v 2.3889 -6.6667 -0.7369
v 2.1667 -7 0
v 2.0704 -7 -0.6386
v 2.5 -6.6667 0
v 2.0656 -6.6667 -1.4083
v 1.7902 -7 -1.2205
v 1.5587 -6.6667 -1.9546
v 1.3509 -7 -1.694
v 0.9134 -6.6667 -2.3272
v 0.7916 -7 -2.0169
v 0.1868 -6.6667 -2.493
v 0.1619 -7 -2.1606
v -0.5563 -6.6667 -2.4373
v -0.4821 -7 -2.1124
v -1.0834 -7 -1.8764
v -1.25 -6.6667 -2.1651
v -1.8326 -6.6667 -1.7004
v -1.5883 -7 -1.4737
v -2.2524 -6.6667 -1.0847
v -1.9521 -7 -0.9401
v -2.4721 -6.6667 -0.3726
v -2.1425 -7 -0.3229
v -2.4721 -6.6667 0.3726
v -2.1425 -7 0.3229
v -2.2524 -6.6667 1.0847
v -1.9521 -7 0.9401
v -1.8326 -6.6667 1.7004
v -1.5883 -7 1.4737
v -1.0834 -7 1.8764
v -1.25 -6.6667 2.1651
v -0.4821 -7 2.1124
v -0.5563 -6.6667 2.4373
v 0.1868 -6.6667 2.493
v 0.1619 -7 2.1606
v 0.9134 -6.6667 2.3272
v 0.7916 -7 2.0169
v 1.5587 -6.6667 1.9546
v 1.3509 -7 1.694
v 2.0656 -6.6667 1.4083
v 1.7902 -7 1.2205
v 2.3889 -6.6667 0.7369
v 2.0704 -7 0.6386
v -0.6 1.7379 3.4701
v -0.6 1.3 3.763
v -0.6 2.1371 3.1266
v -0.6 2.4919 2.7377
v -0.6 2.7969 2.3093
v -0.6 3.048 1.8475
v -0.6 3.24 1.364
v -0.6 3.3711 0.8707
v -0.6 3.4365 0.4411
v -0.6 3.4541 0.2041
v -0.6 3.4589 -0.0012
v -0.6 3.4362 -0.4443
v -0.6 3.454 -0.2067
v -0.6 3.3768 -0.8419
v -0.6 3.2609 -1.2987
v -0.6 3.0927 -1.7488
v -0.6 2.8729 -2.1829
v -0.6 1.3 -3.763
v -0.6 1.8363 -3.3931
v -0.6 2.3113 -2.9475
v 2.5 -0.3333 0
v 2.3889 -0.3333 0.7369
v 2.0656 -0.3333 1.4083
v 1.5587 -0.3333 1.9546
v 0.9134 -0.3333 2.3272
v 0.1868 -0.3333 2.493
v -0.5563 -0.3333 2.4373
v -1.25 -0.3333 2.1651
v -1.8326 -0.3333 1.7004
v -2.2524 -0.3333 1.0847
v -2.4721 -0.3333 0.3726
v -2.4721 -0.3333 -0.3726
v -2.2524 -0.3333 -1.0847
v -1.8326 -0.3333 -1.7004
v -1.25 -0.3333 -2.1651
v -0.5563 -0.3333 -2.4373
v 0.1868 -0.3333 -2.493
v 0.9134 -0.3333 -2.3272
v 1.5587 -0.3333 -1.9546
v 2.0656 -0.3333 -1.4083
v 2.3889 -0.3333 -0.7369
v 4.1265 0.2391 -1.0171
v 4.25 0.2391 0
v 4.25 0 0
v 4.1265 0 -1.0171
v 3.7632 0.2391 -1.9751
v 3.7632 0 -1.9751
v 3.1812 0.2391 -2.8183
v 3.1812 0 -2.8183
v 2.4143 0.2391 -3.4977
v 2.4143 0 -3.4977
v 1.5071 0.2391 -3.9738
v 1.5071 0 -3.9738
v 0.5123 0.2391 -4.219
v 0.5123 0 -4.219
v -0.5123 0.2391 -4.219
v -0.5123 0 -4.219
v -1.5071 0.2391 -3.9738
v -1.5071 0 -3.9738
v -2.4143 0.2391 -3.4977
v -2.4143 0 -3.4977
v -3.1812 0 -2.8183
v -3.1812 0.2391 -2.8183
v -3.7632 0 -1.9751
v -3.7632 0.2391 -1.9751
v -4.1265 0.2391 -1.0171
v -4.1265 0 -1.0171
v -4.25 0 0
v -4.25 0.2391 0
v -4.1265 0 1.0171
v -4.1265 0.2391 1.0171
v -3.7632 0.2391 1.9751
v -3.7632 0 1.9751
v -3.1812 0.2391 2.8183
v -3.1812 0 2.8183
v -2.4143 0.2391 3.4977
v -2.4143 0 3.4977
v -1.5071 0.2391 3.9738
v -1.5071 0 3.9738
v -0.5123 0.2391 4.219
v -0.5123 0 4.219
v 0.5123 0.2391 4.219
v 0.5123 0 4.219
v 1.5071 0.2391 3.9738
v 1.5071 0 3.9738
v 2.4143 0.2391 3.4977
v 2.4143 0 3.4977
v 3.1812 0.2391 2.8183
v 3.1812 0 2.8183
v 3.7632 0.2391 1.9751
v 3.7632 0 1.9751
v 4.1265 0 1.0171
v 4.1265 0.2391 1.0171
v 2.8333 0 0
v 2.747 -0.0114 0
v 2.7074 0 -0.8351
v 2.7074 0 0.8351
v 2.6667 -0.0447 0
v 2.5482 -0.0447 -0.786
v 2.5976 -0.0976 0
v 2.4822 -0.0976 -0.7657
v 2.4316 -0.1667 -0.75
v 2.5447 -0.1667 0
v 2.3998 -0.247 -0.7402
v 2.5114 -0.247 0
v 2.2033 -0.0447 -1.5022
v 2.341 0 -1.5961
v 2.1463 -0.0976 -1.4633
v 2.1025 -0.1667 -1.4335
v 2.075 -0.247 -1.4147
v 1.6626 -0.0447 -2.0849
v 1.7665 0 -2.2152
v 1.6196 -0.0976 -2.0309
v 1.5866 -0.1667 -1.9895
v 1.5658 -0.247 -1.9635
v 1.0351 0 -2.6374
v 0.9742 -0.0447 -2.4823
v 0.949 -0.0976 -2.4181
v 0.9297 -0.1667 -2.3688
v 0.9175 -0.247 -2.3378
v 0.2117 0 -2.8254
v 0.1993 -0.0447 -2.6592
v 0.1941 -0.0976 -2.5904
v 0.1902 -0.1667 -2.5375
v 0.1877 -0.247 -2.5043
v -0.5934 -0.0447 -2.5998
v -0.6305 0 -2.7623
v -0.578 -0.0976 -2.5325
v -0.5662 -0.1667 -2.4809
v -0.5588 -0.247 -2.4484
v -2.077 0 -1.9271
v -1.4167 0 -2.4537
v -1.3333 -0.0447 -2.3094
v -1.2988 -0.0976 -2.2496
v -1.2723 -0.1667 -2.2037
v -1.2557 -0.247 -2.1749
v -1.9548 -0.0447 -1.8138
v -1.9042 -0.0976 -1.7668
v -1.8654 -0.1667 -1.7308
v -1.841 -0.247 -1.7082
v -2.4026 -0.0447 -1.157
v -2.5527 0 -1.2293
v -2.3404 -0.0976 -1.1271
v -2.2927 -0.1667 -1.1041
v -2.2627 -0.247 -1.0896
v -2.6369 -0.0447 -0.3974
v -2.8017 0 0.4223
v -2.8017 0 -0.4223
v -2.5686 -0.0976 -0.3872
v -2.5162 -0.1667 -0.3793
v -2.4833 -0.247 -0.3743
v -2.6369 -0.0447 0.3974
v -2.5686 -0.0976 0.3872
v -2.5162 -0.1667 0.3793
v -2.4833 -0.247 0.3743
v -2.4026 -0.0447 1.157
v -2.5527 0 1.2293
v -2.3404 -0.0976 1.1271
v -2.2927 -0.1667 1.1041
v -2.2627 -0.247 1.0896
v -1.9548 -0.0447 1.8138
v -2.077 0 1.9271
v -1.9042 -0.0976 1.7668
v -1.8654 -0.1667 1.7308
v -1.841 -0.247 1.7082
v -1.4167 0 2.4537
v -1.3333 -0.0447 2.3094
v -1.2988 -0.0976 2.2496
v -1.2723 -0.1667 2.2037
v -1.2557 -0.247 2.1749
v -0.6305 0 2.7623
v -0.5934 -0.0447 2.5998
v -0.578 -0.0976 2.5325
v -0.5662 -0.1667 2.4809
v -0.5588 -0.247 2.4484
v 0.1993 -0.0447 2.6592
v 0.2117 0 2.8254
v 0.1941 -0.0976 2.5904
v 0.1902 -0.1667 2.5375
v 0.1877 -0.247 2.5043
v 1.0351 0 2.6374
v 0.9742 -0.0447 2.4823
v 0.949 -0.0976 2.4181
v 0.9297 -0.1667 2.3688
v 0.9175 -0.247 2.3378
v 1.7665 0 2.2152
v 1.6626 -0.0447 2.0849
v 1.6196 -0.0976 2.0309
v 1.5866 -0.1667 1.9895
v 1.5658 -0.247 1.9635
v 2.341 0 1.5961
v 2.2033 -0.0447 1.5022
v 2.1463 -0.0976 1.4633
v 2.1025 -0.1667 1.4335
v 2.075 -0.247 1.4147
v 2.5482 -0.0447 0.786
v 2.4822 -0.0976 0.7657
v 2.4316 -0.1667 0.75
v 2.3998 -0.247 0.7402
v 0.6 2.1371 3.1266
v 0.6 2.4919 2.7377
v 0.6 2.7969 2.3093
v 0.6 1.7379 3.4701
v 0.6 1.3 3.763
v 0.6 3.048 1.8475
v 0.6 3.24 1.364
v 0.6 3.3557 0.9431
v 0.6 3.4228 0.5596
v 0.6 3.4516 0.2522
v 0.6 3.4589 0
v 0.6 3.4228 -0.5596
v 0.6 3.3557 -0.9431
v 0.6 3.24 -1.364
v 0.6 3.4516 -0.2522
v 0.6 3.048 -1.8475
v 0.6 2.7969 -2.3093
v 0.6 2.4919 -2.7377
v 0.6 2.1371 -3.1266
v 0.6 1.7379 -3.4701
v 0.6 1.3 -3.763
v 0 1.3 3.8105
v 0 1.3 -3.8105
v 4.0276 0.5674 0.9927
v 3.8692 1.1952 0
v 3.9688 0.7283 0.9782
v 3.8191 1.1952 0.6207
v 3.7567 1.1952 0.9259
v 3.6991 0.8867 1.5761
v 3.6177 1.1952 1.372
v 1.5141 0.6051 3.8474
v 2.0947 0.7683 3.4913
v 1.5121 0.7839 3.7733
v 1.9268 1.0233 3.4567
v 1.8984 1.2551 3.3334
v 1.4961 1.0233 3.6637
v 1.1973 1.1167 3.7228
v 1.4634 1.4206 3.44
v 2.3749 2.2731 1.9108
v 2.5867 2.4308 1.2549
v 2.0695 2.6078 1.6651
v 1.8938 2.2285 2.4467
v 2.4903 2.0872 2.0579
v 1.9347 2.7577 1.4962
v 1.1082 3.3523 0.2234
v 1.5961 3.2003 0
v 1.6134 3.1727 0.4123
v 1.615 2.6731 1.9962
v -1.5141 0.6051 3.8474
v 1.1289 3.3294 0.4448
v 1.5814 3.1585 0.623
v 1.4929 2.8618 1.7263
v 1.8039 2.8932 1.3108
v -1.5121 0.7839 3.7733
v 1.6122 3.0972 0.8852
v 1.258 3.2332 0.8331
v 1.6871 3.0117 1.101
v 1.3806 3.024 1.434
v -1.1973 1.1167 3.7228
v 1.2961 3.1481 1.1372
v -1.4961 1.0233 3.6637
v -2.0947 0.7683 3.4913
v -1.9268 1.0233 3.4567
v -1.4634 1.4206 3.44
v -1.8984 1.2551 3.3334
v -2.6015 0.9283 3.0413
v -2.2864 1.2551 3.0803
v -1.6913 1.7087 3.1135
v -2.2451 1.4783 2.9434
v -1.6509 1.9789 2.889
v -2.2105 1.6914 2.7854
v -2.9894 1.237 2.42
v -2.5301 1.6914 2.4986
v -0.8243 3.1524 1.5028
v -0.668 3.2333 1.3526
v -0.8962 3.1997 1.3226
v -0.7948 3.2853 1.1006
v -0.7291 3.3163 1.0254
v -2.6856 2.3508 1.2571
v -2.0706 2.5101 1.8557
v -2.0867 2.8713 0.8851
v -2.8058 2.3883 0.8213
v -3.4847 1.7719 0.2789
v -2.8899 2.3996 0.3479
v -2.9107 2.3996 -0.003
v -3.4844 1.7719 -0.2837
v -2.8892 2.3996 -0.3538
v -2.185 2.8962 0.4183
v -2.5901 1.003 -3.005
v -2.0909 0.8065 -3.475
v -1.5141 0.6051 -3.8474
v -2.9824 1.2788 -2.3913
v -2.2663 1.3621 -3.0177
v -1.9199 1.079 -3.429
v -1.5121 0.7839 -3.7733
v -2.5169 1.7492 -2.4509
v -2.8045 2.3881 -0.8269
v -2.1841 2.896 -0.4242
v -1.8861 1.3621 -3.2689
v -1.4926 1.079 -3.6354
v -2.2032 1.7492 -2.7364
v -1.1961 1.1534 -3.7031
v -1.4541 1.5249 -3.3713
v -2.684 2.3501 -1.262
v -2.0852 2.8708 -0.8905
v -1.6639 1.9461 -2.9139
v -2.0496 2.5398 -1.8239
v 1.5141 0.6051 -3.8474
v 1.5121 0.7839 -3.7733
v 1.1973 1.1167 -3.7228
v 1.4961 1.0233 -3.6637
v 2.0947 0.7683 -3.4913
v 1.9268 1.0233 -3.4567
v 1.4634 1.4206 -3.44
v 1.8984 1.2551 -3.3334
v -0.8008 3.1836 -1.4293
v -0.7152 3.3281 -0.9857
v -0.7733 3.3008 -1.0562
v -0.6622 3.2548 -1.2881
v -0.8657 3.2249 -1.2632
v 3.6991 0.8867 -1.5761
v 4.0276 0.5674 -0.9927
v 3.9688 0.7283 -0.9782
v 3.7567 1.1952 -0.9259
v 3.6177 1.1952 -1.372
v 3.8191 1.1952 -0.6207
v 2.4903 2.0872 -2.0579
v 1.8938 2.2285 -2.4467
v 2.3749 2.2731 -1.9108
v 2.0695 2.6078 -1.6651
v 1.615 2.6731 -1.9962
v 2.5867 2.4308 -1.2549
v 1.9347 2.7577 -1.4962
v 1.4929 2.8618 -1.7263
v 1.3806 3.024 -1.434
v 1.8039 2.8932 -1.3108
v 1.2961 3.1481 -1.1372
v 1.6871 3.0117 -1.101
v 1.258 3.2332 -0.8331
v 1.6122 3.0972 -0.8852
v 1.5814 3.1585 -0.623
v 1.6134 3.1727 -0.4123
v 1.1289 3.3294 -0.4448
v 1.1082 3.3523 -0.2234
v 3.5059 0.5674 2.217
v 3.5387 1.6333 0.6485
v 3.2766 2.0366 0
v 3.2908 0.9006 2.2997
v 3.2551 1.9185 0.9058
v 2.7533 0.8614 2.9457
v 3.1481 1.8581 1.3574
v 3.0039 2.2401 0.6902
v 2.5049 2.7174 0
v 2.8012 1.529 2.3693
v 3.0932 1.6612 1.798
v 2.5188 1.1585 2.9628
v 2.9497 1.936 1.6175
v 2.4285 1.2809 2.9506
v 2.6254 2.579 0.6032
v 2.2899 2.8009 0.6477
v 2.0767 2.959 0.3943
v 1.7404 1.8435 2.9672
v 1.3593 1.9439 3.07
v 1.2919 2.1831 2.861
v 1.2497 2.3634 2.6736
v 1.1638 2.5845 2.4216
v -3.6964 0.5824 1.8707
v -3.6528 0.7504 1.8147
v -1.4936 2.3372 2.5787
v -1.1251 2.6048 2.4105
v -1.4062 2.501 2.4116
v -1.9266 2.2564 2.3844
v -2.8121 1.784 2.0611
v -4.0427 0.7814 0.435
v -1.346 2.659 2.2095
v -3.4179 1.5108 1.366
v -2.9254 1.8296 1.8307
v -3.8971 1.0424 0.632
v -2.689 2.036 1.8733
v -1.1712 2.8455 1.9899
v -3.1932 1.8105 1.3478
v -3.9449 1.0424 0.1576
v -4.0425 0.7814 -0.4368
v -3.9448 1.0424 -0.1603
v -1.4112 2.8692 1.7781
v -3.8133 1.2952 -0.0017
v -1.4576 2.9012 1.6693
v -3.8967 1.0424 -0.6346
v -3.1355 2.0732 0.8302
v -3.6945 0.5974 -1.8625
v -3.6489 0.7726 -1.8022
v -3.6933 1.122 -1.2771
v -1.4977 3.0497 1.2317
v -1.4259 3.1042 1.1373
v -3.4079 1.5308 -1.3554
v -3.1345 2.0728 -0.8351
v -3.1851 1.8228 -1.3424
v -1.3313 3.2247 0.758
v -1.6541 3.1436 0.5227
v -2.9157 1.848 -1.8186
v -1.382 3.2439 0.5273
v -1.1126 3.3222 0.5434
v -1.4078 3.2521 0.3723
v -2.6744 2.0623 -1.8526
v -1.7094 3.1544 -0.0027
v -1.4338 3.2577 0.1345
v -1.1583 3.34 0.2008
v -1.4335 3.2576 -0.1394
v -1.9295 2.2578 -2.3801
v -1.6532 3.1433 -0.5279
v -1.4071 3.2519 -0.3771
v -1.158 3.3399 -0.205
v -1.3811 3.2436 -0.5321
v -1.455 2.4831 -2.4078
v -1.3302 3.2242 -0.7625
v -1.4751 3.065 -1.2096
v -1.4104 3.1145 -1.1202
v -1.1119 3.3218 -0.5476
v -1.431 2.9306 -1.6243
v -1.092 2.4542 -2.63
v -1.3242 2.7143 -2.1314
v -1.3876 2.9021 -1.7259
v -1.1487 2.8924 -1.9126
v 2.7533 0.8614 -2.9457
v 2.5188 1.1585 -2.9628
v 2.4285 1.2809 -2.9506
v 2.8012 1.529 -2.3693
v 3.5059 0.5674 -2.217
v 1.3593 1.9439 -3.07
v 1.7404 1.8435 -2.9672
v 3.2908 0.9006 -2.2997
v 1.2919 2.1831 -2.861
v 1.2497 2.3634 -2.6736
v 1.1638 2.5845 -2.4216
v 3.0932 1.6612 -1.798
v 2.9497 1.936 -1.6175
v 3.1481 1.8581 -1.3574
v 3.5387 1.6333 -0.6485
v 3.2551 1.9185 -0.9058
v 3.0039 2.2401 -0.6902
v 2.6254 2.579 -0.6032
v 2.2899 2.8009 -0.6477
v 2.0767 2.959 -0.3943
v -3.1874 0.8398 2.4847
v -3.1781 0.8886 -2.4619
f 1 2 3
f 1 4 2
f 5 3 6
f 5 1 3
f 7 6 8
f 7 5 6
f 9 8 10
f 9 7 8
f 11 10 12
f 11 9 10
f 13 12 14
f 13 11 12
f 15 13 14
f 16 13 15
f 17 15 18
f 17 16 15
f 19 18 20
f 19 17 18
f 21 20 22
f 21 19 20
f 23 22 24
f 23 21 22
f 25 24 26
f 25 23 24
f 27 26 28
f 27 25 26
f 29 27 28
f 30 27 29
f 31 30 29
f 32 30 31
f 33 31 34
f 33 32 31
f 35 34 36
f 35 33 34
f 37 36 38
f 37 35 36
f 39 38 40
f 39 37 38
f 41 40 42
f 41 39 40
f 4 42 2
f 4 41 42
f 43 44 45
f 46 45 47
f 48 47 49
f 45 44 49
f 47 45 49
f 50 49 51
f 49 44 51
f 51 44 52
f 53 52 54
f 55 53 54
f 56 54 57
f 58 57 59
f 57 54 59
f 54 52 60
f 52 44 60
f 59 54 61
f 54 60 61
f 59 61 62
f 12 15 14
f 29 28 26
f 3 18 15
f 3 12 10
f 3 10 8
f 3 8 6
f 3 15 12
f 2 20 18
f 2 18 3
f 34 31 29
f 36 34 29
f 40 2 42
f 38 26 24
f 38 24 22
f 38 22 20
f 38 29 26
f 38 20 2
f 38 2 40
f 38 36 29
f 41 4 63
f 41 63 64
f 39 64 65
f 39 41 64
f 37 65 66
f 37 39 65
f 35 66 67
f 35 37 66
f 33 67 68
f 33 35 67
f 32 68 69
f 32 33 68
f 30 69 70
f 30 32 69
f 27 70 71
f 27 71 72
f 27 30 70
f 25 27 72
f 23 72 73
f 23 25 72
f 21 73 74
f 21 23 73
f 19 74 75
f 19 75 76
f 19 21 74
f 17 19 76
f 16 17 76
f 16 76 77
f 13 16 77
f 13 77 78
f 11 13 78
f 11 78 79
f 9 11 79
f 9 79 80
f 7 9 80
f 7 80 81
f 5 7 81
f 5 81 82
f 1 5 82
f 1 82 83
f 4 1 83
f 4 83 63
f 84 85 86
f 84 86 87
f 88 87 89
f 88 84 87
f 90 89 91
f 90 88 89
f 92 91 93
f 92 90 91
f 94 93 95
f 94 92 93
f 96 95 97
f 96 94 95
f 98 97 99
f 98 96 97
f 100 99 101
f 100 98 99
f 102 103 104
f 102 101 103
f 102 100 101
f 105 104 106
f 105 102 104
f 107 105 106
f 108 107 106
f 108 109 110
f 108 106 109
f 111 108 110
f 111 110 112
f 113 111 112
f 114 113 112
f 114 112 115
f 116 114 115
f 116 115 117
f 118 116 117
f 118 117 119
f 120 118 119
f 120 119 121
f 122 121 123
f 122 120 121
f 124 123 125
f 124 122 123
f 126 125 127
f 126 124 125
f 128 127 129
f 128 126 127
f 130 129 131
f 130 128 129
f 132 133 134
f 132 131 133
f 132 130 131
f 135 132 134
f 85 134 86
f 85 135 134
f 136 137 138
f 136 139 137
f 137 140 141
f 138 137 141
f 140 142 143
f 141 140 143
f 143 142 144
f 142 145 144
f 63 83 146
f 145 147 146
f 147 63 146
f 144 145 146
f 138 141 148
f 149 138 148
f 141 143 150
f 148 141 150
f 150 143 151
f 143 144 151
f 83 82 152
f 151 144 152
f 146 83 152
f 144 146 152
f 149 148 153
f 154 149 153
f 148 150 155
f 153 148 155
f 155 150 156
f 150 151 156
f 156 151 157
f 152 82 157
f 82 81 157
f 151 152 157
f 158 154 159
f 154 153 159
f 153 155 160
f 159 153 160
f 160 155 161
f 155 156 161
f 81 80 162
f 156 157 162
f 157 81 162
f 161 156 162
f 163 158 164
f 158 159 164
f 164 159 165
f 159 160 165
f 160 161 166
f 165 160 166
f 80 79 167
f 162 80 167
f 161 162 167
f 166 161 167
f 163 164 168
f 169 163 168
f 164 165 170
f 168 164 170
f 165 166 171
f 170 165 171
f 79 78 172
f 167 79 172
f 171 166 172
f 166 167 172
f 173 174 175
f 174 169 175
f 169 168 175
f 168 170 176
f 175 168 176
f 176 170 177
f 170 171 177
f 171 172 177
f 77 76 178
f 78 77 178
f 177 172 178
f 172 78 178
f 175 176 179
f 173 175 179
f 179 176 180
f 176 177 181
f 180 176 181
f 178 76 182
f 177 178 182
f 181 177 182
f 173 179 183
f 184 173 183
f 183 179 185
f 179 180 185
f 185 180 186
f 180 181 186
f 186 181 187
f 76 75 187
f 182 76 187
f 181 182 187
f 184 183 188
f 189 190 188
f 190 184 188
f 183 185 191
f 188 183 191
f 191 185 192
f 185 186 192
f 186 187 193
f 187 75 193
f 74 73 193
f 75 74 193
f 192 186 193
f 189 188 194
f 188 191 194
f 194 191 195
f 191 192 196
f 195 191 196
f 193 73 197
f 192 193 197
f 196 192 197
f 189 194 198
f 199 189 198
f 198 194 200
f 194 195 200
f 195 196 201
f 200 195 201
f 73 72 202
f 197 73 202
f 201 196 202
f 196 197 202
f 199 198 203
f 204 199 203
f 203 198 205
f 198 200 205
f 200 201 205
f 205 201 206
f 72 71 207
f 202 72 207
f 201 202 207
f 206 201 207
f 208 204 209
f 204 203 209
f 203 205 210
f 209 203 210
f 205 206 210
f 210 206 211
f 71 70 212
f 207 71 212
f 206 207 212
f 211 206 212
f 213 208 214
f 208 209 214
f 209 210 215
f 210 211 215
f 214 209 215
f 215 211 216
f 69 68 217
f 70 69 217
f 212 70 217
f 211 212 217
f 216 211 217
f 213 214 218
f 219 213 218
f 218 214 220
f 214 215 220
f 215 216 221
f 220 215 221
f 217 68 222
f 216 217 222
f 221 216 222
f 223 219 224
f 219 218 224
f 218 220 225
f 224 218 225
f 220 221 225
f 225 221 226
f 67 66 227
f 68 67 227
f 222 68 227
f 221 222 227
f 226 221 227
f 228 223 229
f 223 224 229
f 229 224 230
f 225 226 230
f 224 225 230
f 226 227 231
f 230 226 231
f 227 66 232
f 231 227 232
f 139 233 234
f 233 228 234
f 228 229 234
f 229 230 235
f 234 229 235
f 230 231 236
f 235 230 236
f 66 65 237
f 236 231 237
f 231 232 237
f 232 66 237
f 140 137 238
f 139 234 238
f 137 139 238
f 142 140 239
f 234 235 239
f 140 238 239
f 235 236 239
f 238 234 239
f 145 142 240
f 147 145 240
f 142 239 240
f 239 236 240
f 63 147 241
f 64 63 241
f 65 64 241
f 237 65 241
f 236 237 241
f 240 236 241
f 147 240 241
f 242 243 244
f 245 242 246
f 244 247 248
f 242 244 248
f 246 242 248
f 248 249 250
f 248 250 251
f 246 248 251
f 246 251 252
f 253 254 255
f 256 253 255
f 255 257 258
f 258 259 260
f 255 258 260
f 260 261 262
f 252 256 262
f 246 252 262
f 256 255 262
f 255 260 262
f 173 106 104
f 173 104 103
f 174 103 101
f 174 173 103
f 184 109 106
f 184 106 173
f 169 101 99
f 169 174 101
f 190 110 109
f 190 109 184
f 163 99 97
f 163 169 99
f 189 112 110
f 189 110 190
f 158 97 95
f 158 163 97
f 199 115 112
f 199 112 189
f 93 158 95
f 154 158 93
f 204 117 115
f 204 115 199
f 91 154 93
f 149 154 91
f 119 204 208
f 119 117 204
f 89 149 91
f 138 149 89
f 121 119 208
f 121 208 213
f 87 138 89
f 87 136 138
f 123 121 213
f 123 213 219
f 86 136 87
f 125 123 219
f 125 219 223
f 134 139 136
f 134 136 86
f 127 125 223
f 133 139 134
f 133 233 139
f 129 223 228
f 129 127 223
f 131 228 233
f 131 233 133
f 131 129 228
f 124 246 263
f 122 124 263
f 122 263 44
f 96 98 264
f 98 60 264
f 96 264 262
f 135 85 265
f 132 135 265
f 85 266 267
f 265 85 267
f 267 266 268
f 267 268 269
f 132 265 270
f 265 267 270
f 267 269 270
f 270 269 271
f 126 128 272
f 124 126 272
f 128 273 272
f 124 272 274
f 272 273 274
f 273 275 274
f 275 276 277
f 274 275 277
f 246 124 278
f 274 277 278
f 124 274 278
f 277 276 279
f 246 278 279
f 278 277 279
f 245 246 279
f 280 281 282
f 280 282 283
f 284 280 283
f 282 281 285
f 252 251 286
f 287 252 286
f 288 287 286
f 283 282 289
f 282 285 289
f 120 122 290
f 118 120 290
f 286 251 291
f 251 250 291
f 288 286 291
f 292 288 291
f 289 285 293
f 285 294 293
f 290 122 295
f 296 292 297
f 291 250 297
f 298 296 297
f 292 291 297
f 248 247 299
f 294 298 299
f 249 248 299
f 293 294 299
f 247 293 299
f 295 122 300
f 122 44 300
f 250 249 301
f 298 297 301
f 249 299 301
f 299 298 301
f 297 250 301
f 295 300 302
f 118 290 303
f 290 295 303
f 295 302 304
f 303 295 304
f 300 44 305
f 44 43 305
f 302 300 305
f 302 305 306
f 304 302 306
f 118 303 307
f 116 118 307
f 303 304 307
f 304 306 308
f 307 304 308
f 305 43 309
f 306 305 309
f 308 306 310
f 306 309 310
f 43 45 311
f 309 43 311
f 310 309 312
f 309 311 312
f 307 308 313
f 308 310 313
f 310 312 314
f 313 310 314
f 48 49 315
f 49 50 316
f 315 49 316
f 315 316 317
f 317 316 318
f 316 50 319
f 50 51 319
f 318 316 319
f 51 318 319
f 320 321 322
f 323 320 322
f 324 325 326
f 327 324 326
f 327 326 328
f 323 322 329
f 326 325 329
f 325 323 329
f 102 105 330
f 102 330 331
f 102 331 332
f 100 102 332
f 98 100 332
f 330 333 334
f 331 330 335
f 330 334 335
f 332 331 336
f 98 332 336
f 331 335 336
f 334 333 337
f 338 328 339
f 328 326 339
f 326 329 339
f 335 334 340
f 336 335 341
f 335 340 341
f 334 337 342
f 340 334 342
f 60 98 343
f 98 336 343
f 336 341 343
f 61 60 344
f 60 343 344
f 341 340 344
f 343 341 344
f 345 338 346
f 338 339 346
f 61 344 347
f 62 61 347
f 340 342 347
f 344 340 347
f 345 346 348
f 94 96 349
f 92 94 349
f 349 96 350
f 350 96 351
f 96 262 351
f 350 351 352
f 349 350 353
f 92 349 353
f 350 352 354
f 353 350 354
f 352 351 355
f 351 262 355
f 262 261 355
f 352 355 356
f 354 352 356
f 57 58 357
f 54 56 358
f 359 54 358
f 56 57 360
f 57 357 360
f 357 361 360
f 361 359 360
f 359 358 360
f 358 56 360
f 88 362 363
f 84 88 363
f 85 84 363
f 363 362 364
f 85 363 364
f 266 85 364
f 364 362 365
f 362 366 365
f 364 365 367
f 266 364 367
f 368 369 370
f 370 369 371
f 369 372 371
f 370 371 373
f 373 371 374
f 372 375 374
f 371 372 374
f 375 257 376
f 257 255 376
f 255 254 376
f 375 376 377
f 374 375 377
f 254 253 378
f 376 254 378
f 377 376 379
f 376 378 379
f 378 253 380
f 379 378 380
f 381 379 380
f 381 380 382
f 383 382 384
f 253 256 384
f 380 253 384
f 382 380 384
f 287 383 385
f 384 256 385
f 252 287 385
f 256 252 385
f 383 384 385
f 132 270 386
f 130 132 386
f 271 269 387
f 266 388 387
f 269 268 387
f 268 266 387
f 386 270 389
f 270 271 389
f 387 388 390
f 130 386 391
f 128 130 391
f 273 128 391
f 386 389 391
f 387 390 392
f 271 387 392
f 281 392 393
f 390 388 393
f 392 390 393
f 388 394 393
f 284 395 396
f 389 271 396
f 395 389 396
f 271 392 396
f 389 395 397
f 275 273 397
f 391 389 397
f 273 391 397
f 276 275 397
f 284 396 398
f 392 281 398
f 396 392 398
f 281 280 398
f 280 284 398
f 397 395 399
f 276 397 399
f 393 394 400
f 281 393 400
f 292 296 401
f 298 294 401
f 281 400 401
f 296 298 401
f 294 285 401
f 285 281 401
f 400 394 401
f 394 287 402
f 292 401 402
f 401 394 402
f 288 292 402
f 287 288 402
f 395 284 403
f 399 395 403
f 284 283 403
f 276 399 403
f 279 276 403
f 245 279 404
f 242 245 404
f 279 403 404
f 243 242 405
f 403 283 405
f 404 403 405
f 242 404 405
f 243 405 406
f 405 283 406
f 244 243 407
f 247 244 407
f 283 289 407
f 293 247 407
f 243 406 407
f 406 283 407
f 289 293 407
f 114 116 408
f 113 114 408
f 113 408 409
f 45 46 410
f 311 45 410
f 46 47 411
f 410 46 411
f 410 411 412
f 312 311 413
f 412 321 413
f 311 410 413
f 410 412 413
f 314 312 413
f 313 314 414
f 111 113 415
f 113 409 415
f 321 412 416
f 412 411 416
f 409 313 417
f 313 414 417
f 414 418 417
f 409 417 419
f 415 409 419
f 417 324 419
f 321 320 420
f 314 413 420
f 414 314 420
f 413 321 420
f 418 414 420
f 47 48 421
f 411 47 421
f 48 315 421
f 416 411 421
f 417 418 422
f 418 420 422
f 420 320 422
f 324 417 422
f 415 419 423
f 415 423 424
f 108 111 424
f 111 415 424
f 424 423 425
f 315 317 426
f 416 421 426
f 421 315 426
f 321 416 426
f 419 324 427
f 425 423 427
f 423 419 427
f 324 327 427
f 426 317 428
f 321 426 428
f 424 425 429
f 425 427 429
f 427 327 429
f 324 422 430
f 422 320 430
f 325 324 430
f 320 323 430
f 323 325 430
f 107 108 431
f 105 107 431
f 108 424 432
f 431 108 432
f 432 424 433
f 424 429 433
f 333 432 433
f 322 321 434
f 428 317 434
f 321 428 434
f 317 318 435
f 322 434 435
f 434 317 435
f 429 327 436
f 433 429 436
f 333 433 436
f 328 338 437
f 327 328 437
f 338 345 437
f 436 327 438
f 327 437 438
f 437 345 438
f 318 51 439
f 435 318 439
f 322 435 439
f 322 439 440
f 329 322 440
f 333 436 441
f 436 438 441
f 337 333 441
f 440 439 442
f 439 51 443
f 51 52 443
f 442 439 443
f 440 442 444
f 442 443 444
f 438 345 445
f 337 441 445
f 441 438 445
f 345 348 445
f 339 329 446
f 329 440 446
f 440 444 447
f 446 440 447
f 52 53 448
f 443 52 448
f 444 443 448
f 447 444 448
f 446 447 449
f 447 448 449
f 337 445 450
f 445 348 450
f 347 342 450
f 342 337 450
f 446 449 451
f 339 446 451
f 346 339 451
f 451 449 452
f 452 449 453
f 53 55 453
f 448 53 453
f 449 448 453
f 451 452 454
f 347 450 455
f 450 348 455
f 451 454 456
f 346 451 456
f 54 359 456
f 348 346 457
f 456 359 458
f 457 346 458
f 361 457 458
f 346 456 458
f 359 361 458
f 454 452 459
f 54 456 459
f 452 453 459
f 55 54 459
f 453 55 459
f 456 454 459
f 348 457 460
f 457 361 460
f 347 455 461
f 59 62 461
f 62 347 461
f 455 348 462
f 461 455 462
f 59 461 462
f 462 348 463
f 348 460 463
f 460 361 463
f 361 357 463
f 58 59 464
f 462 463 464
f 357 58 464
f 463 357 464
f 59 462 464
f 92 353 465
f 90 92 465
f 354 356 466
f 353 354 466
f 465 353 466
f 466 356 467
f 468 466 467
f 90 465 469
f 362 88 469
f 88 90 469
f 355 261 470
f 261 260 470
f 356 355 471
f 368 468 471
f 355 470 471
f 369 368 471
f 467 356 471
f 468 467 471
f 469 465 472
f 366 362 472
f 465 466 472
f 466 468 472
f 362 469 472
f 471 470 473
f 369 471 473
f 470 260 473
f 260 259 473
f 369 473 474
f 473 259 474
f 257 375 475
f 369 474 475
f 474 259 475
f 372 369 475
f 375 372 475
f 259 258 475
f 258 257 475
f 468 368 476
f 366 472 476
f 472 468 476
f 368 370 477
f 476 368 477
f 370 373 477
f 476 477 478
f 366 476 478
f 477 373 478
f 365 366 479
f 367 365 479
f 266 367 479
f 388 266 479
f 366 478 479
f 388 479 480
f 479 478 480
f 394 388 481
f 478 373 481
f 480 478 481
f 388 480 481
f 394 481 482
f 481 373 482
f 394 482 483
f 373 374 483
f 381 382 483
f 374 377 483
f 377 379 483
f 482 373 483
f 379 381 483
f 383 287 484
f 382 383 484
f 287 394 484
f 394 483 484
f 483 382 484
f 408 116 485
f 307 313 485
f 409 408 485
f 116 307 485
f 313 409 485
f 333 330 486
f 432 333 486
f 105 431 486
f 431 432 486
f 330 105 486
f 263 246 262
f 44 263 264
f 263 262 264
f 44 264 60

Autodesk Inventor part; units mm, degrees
ref_plane "YZ Plane" through (0, 0, 0) normal (1, 0, 0) x (0, 1, 0)
ref_plane "XZ Plane" through (0, 0, 0) normal (0, 1, 0) x (-1, 0, 0)
ref_plane "XY Plane" through (0, 0, 0) normal (0, 0, 1) x (1, 0, 0)
sketch "Sketch1" plane through (0, 0, 0) normal (0, 0, 1) x (1, 0, 0)
  line L0 (0, 3.5) -> (0, -7)
  line L1 (0, 0) -> (4.25, 0) construction
  arc A0 (4.25, 0.2391) -> (0, 3.5) centre (0, -0.9) ccw
  line L2 (4.25, 0) -> (2.5, 0)
  line L3 (2.5, 0) -> (2.5, -7)
  line L4 (2.5, -7) -> (0, -7)
  line L5 (4.25, 0) -> (4.25, 0.2391)
  dimension "d1" = 3.5
  dimension "d2" = 4.4
  dimension "d3" = 5
  dimension "d4" = 7
  dimension "d25" = 8.5
revolve "Вращение1" add sketch "Sketch1" angle 360 about axis through (0, 3.5, 0) along (0, -1, 0)
sketch "Sketch2" plane through (0, 0, 0) normal (0, 0, 1) x (1, 0, 0)
  line L0 (-0.6, 3.5) -> (0.6, 3.5)
  line L1 (0.6, 3.5) -> (0.6, 1.3)
  line L2 (0.6, 1.3) -> (-0.6, 1.3)
  line L3 (-0.6, 1.3) -> (-0.6, 3.5)
  line L4 (0, 0) -> (0, 3.5)
  arc A0 (4.25, 0.2391) -> (-4.25, 0.2391) centre (0, -0.9) ccw construction
  dimension "d6" = 1.3
  dimension "d7" = 1.2
extrude "Выдавливание1" cut sketch "Sketch2" along normal through all both and the other way through all
thread "Резьба1" size "M5x0.8" class "6g" standard "ISO Metric profile" length 7
fillet "Сопряжение1" radius 0.3333 1 edges at (-2.5, 0, 0)
chamfer "Фаска1" distance 0.3333 angle 45 1 edges at (-2.5, -7, 0)
equation "\"d6\" = w"
equation "\"d7\" = n"
equation "\"d10\" = b"
equation "\"d12\" = c_"
equation "\"d13\" = c_"
equation "\"d1\" = k"
equation "\"d2\" = R1"
equation "\"d3\" = d_"
equation "\"d4\" = l_"
equation "\"d25\" = D"
equation "\"d_\" = 5"
equation "\"D\" = 8.5"
equation "\"k\" = 3.5"
equation "\"l_\" = 7"
equation "\"b\" = 7"
equation "\"n\" = 1.2"
equation "\"w\" = 1.3"
equation "\"c_\" = 0.0666667 * d_"
equation "\"R1\" = 4.4"
equation "\"G\" = 0"
properties part number "Винт A.M5-6gx7 ГОСТ 17473-80" material "Сталь, мягкая"
